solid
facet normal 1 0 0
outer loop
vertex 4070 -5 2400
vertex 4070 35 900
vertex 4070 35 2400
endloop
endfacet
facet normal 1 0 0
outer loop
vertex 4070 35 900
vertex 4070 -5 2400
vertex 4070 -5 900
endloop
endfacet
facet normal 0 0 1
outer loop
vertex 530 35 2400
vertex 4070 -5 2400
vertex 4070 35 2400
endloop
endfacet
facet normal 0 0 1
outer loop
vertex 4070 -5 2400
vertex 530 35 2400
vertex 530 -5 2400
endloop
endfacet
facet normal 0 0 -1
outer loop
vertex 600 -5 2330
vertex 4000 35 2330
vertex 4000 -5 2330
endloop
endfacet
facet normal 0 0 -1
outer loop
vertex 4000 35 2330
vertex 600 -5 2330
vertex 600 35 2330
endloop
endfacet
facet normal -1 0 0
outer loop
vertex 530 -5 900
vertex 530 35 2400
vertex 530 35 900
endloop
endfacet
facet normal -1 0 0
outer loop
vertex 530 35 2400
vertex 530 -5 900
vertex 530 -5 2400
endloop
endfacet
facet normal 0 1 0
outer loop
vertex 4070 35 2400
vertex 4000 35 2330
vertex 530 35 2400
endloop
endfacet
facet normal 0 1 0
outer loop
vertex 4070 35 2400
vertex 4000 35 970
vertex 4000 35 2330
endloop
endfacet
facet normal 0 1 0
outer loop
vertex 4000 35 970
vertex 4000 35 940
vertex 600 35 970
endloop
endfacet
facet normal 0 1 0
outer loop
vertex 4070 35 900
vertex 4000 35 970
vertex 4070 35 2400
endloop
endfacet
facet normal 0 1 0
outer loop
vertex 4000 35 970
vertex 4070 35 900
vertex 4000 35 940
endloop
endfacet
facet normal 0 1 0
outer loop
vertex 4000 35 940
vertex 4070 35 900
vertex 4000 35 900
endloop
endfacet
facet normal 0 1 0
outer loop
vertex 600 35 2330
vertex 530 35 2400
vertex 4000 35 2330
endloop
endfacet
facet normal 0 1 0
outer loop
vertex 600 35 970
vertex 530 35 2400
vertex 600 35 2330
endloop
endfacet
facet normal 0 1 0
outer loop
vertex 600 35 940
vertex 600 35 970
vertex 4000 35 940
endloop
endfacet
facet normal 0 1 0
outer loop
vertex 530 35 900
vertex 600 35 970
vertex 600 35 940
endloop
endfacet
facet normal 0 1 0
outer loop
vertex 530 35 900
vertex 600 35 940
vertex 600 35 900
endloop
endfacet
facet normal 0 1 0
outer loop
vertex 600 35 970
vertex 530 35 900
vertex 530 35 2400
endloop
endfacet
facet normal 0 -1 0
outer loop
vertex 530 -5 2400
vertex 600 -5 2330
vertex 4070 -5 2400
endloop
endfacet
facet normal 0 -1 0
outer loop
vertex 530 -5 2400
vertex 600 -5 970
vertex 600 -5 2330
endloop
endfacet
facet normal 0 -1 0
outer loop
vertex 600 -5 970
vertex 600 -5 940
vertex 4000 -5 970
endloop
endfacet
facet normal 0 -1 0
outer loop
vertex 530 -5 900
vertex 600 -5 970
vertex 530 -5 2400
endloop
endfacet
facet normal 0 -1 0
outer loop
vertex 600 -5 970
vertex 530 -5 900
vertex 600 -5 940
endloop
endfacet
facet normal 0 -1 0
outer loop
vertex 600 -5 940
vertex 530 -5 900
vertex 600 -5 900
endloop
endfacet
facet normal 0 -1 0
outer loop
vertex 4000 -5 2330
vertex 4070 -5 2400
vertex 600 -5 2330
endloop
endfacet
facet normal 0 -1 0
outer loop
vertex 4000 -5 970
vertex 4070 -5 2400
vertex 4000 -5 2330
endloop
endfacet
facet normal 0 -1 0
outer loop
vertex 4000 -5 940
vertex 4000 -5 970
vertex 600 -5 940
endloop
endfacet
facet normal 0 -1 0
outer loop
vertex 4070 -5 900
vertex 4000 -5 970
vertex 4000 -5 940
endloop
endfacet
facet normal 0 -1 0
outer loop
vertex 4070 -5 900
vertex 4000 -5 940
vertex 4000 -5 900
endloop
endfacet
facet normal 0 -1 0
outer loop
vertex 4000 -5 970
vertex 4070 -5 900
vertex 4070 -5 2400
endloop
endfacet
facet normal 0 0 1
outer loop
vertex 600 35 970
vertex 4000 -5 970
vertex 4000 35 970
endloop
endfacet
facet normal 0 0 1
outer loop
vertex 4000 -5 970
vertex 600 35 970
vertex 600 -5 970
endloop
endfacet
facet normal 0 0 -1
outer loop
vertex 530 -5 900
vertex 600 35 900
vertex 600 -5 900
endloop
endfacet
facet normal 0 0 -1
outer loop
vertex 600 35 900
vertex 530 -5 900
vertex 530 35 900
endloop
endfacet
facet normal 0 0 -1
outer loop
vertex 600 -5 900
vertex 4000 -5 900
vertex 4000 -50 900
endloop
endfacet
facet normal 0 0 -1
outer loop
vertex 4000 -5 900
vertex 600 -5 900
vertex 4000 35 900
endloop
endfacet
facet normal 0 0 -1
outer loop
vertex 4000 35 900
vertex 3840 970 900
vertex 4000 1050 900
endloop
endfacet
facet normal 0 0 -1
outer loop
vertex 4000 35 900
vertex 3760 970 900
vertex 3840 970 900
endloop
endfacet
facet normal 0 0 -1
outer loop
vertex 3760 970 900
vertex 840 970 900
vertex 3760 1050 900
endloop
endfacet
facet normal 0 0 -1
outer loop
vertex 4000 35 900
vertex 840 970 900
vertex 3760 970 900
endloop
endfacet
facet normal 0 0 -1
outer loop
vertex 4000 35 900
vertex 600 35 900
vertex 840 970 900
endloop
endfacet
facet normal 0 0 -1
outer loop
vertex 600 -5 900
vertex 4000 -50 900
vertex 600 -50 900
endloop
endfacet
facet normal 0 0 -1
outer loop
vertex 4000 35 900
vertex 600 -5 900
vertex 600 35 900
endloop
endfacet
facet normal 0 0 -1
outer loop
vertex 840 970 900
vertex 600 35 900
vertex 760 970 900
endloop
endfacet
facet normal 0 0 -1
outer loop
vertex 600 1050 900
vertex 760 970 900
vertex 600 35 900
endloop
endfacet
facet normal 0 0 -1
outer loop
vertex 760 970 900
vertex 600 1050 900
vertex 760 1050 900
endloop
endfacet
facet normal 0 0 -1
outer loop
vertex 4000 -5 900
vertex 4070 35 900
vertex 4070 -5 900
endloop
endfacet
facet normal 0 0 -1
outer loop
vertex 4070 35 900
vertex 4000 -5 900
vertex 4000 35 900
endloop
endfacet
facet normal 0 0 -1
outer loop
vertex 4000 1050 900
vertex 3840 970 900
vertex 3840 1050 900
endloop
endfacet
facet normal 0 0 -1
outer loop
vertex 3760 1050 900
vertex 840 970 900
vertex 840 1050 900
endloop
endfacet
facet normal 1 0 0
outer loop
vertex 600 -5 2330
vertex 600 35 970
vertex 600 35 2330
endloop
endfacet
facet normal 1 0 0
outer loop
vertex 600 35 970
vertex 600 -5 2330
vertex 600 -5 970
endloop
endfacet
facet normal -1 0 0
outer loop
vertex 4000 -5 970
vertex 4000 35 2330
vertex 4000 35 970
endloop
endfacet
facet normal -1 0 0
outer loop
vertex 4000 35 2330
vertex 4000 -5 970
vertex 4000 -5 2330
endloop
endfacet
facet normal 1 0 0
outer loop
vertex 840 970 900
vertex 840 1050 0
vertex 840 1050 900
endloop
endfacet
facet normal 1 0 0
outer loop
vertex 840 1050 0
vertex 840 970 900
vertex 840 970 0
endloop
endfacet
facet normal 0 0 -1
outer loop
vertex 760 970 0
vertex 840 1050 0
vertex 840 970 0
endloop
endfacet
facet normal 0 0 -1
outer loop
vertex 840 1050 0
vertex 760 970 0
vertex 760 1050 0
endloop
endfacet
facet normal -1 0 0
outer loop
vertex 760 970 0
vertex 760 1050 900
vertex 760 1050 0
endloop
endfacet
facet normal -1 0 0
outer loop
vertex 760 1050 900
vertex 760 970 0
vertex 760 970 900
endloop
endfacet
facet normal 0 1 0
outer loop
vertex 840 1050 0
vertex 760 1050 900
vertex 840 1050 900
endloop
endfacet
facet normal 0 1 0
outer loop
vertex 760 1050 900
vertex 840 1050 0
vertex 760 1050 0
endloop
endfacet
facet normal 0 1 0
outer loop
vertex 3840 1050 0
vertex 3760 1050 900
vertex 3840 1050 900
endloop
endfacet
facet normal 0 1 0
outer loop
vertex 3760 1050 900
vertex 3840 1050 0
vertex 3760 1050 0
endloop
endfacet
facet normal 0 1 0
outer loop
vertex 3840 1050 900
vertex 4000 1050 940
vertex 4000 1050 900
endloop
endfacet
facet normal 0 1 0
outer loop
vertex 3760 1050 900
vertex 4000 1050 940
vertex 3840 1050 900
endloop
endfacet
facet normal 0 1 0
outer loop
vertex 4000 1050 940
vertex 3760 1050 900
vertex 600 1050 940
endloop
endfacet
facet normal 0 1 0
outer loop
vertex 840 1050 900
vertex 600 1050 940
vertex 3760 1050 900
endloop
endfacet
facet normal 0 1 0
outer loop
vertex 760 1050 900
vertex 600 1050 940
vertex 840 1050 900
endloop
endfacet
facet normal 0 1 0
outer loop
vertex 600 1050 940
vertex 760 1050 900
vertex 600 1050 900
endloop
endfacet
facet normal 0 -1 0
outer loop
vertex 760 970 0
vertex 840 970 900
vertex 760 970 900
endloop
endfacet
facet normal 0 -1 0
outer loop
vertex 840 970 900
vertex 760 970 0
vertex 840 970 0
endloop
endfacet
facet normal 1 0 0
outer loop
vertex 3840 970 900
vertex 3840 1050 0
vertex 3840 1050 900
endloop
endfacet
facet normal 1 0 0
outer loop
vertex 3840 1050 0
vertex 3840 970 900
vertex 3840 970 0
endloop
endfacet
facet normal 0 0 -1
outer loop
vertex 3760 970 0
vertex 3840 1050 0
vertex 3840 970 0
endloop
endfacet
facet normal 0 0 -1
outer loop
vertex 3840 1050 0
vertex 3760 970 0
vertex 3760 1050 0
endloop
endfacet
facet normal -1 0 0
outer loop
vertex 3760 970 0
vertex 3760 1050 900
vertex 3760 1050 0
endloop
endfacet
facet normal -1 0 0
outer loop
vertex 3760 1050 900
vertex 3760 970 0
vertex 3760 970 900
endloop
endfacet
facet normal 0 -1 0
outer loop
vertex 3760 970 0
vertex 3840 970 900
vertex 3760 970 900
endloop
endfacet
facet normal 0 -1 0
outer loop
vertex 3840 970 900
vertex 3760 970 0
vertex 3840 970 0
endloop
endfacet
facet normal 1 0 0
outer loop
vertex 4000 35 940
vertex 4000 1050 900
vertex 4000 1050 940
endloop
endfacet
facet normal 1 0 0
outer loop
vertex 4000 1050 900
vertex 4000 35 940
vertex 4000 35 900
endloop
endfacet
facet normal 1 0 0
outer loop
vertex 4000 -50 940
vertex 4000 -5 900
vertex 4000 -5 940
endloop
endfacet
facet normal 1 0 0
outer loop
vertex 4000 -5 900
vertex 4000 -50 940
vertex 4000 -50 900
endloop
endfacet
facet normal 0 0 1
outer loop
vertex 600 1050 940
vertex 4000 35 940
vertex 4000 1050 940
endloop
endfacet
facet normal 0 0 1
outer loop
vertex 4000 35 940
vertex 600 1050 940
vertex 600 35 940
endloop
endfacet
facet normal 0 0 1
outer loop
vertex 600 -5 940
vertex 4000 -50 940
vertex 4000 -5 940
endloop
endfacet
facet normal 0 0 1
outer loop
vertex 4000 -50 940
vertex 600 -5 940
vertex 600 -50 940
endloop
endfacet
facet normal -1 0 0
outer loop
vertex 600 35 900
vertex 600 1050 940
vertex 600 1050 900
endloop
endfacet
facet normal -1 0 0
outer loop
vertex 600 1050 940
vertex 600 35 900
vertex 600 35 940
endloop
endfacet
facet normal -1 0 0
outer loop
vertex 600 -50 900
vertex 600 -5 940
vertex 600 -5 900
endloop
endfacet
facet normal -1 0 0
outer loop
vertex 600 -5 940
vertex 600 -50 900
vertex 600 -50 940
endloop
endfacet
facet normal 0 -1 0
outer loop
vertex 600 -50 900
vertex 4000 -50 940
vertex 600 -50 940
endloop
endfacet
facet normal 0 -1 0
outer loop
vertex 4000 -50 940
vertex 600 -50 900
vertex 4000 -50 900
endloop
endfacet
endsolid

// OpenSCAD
// part_counter_legs.scad — Export both support legs as one combined OBJ.
// Press F6 (render), then File -> Export as OBJ.
include <tea_shop_counter_modules.scad>;
counter_support_leg(LEG_LEFT_X);
counter_support_leg(LEG_RIGHT_X);
